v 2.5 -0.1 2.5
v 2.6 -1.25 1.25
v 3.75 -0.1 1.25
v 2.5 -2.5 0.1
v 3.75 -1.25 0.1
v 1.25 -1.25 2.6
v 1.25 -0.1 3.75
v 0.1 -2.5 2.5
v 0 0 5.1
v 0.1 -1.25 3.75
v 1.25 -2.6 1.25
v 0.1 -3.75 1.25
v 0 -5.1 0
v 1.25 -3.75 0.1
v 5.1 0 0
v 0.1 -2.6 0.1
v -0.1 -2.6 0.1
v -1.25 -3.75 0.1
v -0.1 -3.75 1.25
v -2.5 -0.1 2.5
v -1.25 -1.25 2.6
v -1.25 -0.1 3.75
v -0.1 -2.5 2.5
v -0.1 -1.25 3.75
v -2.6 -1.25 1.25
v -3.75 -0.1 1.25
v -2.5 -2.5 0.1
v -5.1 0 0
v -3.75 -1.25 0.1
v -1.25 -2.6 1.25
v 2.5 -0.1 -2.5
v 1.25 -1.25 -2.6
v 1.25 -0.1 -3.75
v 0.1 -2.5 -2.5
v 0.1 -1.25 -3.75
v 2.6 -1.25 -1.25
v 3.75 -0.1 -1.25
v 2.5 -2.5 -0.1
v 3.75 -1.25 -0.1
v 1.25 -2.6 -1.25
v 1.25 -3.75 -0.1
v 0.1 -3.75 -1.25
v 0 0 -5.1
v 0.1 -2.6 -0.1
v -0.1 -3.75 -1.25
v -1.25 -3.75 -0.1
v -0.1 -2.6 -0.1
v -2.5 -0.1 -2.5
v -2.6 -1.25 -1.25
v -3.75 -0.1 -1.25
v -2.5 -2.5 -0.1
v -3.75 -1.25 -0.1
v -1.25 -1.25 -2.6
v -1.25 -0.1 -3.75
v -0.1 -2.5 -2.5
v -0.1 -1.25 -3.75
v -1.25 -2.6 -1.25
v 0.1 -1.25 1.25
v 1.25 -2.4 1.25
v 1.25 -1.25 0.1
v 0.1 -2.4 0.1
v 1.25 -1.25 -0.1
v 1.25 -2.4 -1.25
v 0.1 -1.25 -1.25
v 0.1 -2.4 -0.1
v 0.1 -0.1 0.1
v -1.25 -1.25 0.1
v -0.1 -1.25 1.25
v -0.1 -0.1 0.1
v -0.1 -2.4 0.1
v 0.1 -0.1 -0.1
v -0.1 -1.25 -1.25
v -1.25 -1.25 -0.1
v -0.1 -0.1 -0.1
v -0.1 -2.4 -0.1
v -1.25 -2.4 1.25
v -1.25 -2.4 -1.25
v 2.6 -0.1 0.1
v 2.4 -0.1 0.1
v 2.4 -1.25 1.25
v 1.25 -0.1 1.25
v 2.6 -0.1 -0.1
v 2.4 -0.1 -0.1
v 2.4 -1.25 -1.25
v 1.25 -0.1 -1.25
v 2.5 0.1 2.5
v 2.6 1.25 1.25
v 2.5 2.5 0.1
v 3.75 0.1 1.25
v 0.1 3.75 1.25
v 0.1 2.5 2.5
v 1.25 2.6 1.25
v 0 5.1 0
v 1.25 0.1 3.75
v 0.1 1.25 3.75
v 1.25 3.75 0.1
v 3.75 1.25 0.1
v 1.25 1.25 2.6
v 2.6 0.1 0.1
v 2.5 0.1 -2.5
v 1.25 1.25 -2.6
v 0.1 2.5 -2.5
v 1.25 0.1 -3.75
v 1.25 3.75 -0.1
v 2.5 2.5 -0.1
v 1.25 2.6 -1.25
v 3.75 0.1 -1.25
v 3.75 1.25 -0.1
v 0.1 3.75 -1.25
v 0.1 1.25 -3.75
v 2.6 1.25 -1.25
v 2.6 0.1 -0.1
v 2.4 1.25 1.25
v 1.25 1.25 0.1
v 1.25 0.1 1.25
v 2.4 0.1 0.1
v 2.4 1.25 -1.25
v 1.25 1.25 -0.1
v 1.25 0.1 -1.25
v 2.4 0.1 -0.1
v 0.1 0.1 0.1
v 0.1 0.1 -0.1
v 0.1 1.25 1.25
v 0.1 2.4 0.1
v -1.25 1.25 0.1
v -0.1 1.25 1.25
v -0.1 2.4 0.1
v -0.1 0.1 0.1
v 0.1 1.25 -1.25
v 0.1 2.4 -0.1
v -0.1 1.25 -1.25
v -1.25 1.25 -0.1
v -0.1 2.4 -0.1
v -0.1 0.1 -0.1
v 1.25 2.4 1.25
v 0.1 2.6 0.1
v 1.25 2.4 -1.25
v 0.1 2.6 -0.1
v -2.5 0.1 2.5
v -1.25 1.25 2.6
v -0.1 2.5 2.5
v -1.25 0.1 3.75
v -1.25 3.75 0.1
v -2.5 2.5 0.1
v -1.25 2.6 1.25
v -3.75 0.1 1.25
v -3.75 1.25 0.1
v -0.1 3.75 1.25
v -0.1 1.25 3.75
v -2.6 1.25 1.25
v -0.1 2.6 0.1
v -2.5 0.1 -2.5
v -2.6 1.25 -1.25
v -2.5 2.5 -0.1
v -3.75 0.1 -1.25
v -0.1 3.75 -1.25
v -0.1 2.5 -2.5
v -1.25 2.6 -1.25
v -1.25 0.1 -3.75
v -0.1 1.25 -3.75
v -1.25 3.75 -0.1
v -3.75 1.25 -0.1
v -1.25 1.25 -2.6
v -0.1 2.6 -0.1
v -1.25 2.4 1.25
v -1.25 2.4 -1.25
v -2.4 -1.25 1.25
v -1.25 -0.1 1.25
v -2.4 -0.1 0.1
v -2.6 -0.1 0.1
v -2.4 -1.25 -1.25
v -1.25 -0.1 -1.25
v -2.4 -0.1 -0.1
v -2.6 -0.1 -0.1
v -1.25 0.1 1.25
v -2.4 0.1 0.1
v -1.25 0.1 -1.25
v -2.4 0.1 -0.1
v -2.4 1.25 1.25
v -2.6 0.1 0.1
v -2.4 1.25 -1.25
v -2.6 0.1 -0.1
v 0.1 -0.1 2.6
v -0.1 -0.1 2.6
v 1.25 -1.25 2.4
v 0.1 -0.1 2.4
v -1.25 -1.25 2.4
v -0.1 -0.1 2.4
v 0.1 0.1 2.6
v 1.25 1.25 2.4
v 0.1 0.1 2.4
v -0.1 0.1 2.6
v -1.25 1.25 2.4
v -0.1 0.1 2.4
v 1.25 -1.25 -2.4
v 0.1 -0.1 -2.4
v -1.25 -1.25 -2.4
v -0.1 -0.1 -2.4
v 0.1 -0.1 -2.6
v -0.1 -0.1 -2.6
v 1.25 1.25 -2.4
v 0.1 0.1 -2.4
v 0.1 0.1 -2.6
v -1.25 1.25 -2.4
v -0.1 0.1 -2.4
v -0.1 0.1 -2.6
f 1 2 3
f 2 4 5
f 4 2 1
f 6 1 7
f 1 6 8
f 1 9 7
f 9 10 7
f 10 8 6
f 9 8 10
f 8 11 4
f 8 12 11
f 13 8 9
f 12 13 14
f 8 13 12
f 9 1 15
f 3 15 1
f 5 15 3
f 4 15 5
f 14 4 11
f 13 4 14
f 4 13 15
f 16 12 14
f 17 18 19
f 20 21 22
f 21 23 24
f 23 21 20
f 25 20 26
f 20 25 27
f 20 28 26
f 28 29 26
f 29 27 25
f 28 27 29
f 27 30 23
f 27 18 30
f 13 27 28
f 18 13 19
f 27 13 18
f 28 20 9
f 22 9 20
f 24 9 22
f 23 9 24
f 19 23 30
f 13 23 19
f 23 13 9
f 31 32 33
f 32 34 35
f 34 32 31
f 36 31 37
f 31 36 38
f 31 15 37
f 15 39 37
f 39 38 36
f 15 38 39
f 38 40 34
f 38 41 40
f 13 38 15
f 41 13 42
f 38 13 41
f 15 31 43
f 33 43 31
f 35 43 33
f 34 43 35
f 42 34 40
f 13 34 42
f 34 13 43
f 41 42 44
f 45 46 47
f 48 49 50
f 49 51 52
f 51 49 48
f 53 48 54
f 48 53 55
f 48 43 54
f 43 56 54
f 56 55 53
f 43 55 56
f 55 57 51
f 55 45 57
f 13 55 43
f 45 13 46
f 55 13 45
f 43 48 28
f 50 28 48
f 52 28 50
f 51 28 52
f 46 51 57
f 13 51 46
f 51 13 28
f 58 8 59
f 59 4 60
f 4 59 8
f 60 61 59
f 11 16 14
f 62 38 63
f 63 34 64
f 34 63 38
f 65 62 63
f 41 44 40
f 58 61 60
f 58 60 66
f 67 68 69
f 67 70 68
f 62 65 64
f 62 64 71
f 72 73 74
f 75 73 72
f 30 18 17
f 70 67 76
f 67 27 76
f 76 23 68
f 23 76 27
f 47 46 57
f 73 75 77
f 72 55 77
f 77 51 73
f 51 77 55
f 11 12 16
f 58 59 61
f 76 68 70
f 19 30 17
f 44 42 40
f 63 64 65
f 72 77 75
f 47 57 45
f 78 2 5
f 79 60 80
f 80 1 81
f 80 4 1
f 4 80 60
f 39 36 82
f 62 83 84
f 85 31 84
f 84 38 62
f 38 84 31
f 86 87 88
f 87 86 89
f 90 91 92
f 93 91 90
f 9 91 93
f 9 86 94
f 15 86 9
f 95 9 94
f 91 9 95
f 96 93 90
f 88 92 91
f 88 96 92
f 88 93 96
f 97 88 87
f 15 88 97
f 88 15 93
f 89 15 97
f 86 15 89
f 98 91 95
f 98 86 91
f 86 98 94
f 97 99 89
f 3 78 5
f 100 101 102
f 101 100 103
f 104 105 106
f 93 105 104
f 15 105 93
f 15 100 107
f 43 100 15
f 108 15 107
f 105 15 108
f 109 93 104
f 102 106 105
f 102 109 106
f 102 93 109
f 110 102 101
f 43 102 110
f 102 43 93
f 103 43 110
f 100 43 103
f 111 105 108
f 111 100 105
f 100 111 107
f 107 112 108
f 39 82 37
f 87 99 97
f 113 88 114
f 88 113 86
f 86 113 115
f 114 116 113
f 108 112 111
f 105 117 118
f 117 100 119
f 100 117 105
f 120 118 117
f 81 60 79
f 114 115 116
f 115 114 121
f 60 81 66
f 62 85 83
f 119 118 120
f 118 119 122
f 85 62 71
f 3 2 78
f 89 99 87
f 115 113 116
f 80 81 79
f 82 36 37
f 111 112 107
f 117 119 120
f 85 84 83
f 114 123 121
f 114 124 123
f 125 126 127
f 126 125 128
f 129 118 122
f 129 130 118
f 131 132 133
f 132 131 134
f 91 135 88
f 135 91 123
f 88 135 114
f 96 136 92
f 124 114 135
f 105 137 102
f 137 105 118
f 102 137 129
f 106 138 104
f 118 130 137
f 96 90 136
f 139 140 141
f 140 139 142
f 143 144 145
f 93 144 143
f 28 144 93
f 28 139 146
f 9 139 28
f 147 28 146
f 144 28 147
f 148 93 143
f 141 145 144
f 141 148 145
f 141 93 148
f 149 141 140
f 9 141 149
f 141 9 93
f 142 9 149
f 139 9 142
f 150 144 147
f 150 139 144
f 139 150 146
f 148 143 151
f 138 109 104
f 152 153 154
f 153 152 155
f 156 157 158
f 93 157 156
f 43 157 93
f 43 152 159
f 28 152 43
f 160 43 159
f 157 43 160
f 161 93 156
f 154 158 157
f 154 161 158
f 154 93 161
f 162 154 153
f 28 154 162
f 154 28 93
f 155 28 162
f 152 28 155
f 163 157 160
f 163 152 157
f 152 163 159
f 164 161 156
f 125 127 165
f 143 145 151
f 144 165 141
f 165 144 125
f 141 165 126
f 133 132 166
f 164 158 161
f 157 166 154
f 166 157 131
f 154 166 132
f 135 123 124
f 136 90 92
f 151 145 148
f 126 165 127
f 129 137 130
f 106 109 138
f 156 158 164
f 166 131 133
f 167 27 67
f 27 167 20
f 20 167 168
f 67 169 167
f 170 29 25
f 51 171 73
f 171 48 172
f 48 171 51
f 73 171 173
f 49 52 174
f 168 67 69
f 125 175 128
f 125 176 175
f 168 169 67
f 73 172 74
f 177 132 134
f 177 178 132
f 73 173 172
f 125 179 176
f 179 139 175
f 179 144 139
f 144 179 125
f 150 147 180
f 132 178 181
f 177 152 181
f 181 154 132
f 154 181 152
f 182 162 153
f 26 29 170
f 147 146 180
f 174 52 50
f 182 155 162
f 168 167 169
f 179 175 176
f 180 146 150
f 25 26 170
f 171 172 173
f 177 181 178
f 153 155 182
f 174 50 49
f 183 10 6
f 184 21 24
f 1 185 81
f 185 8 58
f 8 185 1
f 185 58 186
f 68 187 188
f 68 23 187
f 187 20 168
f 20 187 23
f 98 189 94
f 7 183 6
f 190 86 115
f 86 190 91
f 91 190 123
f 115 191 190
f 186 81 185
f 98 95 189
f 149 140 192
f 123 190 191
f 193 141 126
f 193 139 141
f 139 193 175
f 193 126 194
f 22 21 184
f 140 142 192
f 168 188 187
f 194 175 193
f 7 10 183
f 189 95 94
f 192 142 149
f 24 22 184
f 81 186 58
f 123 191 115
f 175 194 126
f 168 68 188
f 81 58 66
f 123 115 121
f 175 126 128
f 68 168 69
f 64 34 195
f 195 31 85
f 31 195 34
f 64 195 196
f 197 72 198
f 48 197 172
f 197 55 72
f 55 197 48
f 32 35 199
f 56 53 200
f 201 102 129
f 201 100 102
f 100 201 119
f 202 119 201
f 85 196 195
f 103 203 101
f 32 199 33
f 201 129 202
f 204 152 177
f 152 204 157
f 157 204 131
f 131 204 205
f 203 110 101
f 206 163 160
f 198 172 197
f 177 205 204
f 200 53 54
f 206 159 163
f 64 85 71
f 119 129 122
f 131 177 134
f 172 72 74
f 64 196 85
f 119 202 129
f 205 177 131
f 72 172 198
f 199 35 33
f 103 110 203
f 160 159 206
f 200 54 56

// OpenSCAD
module octahedron() {
    
     octo_points = [
        [0, -1, 0], // belt
        [ 1, 0, 0], 
        [ 0,  1, 0], 
        [-1,  0, 0], 
        [0, 0, 1], // top
        [0, 0, -1], // bottom
    ];

    octo_faces = [
        [0, 1, 4], // top pyramid
        [1, 2, 4],
        [2, 3, 4],
        [3, 0, 4],
        [1, 0, 5], // bottom pyramid
        [2, 1, 5],
        [3, 2, 5],
        [0, 3, 5],
    ];

    polyhedron(
        points = octo_points,
        faces = octo_faces
    );
}



module octoflake(i, size, center){
    
    if (i == 0){
        translate(center) scale(size + .1) octahedron();
    } else {
        octoflake(i-1, size/2, center + 1/2 * size * [0, -1, 0]);
        octoflake(i-1, size/2, center + 1/2 * size * [1, 0, 0]);
        octoflake(i-1, size/2, center + 1/2 * size * [0, 1, 0]);
        octoflake(i-1, size/2, center + 1/2 * size * [-1, 0, 0]);
        octoflake(i-1, size/2, center + 1/2 * size * [0, 0, 1]);
        octoflake(i-1, size/2, center + 1/2 * size * [0, 0, -1]);
    }
    
    
}




octoflake(2, 5, [0,0,0]);
